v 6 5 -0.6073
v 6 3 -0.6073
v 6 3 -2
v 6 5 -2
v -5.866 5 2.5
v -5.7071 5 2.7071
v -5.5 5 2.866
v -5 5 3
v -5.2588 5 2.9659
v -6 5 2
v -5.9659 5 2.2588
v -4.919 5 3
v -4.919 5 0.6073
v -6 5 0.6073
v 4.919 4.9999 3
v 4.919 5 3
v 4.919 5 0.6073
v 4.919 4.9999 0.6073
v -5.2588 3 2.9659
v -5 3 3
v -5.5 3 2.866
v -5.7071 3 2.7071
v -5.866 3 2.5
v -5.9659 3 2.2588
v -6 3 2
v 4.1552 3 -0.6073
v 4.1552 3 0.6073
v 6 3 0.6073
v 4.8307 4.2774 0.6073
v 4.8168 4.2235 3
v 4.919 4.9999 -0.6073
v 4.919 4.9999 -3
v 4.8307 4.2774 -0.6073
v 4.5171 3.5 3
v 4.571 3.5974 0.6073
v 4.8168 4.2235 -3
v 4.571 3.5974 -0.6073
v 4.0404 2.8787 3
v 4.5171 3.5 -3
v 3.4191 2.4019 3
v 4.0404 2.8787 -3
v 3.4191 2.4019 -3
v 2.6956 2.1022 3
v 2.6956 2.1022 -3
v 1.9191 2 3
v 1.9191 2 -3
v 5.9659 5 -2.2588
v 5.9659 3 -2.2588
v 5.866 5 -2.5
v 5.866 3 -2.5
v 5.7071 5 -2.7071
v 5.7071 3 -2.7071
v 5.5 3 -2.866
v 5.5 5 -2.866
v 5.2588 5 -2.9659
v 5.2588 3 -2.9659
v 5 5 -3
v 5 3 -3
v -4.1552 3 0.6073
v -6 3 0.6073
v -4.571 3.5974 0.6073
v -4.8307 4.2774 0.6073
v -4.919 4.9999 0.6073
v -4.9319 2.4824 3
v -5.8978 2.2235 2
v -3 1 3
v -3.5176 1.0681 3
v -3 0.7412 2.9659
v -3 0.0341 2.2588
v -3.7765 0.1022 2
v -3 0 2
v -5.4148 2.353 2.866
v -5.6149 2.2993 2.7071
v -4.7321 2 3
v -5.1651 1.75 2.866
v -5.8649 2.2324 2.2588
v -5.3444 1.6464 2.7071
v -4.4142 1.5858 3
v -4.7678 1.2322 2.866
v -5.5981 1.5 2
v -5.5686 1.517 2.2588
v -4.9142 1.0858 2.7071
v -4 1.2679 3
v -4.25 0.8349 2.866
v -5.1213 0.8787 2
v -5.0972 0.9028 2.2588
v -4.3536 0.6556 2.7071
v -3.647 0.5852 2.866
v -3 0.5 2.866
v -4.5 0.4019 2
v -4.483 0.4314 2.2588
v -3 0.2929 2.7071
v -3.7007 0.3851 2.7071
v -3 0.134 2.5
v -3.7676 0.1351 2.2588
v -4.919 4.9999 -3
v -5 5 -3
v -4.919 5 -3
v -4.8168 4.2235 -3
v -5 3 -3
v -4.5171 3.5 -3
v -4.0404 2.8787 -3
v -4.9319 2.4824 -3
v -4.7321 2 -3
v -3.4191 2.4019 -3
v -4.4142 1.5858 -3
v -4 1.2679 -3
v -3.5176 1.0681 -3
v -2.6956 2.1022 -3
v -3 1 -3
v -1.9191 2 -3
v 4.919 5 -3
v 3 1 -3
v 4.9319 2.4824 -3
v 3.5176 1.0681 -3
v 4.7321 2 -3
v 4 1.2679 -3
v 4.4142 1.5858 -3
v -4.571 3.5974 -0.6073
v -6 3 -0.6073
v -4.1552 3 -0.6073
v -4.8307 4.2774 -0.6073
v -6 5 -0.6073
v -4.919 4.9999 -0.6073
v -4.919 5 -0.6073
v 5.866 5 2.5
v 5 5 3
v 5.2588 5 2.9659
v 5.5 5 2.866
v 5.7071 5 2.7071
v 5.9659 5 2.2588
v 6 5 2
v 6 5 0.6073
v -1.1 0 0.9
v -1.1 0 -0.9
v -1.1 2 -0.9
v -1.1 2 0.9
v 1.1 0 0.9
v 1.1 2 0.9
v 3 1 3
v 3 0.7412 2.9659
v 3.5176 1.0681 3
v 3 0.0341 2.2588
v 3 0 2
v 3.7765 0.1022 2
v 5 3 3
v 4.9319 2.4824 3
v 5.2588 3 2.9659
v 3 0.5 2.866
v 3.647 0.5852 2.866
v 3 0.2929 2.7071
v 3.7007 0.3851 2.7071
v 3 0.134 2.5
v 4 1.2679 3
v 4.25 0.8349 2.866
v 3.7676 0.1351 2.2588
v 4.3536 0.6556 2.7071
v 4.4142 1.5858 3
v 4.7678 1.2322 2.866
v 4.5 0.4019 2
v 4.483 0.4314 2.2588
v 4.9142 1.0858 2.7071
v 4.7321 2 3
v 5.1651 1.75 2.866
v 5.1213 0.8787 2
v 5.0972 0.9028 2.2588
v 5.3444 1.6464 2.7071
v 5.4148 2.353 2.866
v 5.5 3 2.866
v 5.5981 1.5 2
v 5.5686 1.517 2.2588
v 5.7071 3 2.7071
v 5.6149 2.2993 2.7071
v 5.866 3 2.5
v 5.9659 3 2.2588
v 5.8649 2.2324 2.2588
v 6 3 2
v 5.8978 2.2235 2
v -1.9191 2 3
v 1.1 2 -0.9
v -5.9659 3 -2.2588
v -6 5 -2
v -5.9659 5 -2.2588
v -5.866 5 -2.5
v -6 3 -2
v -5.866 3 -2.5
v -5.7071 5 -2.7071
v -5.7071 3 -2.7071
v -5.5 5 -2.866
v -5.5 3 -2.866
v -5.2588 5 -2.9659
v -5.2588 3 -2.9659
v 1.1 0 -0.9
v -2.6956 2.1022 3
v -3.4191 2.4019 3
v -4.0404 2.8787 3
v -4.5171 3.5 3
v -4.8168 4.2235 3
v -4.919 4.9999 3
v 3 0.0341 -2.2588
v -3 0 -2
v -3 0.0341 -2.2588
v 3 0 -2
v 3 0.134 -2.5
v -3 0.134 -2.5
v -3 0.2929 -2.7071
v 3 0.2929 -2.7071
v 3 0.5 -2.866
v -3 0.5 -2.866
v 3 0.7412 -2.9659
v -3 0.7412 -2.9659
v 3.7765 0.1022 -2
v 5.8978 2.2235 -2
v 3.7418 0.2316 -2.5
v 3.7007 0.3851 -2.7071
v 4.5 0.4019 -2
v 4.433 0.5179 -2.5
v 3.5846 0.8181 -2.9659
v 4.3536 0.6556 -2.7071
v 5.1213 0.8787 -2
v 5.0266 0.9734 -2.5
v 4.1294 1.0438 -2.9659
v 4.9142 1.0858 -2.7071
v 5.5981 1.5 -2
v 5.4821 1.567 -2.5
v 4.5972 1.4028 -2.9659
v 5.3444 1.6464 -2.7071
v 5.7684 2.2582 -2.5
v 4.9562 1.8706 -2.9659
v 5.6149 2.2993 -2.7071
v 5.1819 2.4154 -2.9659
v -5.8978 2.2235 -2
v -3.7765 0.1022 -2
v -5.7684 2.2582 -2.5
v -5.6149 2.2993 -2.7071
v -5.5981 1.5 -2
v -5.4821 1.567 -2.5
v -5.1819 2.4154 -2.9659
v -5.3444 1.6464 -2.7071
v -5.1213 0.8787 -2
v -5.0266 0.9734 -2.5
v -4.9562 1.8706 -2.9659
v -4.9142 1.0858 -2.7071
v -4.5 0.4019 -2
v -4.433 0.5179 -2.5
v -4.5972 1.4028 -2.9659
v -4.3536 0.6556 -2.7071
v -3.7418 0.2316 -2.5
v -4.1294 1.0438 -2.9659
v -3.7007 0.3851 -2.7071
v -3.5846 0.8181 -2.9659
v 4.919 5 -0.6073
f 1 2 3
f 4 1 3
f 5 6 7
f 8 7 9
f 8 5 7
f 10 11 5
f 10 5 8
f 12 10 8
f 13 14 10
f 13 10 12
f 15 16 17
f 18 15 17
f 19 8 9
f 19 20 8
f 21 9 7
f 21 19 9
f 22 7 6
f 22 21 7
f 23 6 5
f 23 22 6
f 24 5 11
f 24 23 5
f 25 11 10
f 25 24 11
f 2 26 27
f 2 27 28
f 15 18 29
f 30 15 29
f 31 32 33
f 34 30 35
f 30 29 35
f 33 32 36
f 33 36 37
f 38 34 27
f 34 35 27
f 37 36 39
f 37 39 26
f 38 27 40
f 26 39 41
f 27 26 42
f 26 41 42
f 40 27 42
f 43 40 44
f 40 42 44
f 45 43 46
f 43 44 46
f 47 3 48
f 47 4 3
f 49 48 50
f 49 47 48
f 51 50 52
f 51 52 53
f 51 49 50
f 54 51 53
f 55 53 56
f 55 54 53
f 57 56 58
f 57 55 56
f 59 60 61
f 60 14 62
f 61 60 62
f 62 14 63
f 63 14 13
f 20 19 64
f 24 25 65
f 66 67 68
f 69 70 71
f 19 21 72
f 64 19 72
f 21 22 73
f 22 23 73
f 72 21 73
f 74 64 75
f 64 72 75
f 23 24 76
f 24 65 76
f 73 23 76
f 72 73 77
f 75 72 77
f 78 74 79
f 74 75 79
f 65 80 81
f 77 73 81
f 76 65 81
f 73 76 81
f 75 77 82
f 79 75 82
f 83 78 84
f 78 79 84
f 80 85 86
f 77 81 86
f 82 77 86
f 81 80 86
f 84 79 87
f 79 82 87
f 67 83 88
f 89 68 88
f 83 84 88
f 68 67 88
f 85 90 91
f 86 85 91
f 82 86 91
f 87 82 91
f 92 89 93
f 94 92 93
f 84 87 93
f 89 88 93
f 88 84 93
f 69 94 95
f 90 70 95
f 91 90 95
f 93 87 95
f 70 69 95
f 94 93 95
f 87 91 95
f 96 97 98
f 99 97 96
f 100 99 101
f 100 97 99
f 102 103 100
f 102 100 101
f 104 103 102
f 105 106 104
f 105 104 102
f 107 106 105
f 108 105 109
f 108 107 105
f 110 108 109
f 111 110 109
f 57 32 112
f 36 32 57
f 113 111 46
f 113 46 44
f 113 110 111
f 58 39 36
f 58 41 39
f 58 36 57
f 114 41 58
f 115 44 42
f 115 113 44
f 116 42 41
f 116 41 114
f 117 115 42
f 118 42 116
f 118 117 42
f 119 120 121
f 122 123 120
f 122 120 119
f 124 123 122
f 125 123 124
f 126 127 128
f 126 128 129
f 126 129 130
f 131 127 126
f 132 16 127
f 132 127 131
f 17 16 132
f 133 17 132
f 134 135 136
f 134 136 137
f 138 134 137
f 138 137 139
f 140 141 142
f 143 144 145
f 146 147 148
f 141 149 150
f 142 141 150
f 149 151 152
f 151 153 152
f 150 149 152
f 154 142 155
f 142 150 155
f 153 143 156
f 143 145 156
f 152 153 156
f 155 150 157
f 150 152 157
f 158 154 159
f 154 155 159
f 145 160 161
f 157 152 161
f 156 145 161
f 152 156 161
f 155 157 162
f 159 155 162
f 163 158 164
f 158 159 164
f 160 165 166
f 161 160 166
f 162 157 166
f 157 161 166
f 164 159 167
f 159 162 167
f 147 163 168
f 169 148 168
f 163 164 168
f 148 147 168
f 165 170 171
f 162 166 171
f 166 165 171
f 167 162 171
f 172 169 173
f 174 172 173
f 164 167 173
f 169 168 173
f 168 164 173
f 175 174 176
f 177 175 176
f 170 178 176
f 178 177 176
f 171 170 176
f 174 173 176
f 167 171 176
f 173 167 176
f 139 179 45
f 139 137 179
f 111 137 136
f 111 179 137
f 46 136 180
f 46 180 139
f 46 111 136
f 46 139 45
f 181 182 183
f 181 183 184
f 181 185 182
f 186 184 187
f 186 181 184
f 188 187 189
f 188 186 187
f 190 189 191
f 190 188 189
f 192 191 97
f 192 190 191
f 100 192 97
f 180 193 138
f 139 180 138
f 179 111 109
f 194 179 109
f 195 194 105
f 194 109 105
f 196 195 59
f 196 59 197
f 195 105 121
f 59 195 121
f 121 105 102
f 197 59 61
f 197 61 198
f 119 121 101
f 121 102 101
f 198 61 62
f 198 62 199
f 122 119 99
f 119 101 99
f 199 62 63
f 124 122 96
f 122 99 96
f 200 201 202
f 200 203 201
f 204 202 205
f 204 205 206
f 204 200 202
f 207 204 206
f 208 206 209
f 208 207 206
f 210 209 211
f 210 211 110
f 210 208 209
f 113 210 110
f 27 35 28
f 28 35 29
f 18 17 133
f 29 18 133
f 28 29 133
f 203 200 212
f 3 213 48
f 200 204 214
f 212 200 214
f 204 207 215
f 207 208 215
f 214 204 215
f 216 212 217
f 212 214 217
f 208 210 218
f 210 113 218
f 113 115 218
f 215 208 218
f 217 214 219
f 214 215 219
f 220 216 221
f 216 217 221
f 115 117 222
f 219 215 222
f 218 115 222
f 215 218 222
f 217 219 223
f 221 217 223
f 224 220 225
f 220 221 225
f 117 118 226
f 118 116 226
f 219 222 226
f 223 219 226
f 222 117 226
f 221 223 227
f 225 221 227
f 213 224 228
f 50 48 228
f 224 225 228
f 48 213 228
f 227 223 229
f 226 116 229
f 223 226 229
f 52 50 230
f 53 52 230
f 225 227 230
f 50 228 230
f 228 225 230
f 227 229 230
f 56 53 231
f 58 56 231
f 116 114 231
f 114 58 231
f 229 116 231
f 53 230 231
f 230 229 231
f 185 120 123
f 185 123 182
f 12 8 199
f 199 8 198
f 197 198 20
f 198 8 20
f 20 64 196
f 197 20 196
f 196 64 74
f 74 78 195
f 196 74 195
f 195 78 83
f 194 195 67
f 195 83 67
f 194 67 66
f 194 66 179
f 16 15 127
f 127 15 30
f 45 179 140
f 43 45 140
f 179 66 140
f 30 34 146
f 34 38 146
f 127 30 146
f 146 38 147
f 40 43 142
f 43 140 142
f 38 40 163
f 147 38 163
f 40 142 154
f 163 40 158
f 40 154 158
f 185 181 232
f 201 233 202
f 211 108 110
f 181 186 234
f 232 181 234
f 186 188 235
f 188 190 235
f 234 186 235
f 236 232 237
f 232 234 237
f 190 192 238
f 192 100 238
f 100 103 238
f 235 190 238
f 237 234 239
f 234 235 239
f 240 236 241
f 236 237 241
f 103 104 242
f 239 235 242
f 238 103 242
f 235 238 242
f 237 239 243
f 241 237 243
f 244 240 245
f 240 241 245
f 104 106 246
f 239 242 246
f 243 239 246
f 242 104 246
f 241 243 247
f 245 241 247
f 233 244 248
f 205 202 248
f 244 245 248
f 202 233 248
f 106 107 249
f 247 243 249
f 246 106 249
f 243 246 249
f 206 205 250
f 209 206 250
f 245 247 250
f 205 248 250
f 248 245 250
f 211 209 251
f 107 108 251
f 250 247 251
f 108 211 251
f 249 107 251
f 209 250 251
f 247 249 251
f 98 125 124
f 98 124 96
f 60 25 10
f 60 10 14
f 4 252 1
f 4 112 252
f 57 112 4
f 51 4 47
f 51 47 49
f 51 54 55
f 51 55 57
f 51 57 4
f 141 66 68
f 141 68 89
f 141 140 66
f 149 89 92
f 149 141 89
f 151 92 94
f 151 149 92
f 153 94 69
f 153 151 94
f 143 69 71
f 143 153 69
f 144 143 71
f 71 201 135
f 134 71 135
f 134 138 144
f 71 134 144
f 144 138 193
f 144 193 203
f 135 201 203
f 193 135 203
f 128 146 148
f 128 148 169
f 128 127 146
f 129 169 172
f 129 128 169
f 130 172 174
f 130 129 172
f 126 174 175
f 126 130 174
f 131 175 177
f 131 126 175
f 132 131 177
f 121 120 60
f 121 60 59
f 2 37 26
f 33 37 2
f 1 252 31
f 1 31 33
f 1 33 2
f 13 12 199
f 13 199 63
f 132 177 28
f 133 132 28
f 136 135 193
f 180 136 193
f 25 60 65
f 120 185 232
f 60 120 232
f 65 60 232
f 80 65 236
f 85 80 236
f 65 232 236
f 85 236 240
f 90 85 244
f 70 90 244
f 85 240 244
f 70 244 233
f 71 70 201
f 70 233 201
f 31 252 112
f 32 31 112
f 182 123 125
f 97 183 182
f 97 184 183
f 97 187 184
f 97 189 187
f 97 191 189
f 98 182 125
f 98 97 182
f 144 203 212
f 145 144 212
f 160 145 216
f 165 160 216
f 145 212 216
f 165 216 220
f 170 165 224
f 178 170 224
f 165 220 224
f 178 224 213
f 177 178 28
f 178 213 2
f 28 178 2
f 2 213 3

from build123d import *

# Parameters (mm, degrees)
SKETCH_1_W          = 12
SKETCH_1_H          = 6
EXTRUDE_1_DEPTH     = 5
SKETCH_2_W          = 2.2
SKETCH_2_H          = 1.8
CUT_EXTRUDE_1_DEPTH = 5
FILLET_1_R          = 3
SKETCH_3_W          = 9.838074984
SKETCH_3_H          = 6
CUT_EXTRUDE_2_DEPTH = 3
FILLET_2_R          = 3
FILLET_3_R          = 1
FILLET_4_R          = 1
SKETCH_4_W          = 12
SKETCH_4_H          = 1.214577158
CUT_EXTRUDE_3_DEPTH = 2


with BuildPart() as part:
    # Эскиз1 → Бобышка-Вытянуть1 (new body)
    with BuildSketch(Plane(origin=(0, 0, 0), x_dir=(1, 0, 0), z_dir=(0, 1, 0))):
        Rectangle(SKETCH_1_W, SKETCH_1_H)
    extrude(amount=EXTRUDE_1_DEPTH)

    # Эскиз2 → Вырез-Вытянуть1 (cut)
    with BuildSketch(Plane.XZ):
        Rectangle(SKETCH_2_W, SKETCH_2_H)
    extrude(amount=-CUT_EXTRUDE_1_DEPTH, mode=Mode.SUBTRACT)

    # Скругление1
    fillet_1_edges = [part.edges().sort_by_distance(p)[0] for p in [
        (6, 0, 0),
        (-6, 0, 0),
    ]]
    fillet(fillet_1_edges, radius=FILLET_1_R)

    # Эскиз3 → Вырез-Вытянуть2 (cut)
    with BuildSketch(Plane(origin=(0, 5, 0), x_dir=(1, 0, 0), z_dir=(0, 1, 0))):
        Rectangle(SKETCH_3_W, SKETCH_3_H)
    extrude(amount=-CUT_EXTRUDE_2_DEPTH, mode=Mode.SUBTRACT)

    # Скругление2
    fillet_2_edges = [part.edges().sort_by_distance(p)[0] for p in [
        (4.919037492, 2, 0),
        (-4.919037492, 2, 0),
    ]]
    fillet(fillet_2_edges, radius=FILLET_2_R - 0.0001)  # a hair under: the kernel refuses the full size

    # Скругление3
    fillet_3_edges = [part.edges().sort_by_distance(p)[0] for p in [
        (0, 0, -3),
        (-5.121320344, 0.878679656, -3),
        (5.121320344, 0.878679656, -3),
        (-6, 4, -3),
        (6, 4, -3),
    ]]
    fillet(fillet_3_edges, radius=FILLET_3_R)

    # Скругление4
    fillet_4_edges = [part.edges().sort_by_distance(p)[0] for p in [
        (0, 0, 3),
        (-5.121320344, 0.878679656, 3),
        (5.121320344, 0.878679656, 3),
        (6, 4, 3),
        (-6, 4, 3),
    ]]
    fillet(fillet_4_edges, radius=FILLET_4_R)

    # Эскиз4 → Вырез-Вытянуть3 (cut)
    with BuildSketch(Plane(origin=(0, 5, 0), x_dir=(1, 0, 0), z_dir=(0, 1, 0))):
        Rectangle(SKETCH_4_W, SKETCH_4_H)
    extrude(amount=-CUT_EXTRUDE_3_DEPTH, mode=Mode.SUBTRACT)


solid = part.part
